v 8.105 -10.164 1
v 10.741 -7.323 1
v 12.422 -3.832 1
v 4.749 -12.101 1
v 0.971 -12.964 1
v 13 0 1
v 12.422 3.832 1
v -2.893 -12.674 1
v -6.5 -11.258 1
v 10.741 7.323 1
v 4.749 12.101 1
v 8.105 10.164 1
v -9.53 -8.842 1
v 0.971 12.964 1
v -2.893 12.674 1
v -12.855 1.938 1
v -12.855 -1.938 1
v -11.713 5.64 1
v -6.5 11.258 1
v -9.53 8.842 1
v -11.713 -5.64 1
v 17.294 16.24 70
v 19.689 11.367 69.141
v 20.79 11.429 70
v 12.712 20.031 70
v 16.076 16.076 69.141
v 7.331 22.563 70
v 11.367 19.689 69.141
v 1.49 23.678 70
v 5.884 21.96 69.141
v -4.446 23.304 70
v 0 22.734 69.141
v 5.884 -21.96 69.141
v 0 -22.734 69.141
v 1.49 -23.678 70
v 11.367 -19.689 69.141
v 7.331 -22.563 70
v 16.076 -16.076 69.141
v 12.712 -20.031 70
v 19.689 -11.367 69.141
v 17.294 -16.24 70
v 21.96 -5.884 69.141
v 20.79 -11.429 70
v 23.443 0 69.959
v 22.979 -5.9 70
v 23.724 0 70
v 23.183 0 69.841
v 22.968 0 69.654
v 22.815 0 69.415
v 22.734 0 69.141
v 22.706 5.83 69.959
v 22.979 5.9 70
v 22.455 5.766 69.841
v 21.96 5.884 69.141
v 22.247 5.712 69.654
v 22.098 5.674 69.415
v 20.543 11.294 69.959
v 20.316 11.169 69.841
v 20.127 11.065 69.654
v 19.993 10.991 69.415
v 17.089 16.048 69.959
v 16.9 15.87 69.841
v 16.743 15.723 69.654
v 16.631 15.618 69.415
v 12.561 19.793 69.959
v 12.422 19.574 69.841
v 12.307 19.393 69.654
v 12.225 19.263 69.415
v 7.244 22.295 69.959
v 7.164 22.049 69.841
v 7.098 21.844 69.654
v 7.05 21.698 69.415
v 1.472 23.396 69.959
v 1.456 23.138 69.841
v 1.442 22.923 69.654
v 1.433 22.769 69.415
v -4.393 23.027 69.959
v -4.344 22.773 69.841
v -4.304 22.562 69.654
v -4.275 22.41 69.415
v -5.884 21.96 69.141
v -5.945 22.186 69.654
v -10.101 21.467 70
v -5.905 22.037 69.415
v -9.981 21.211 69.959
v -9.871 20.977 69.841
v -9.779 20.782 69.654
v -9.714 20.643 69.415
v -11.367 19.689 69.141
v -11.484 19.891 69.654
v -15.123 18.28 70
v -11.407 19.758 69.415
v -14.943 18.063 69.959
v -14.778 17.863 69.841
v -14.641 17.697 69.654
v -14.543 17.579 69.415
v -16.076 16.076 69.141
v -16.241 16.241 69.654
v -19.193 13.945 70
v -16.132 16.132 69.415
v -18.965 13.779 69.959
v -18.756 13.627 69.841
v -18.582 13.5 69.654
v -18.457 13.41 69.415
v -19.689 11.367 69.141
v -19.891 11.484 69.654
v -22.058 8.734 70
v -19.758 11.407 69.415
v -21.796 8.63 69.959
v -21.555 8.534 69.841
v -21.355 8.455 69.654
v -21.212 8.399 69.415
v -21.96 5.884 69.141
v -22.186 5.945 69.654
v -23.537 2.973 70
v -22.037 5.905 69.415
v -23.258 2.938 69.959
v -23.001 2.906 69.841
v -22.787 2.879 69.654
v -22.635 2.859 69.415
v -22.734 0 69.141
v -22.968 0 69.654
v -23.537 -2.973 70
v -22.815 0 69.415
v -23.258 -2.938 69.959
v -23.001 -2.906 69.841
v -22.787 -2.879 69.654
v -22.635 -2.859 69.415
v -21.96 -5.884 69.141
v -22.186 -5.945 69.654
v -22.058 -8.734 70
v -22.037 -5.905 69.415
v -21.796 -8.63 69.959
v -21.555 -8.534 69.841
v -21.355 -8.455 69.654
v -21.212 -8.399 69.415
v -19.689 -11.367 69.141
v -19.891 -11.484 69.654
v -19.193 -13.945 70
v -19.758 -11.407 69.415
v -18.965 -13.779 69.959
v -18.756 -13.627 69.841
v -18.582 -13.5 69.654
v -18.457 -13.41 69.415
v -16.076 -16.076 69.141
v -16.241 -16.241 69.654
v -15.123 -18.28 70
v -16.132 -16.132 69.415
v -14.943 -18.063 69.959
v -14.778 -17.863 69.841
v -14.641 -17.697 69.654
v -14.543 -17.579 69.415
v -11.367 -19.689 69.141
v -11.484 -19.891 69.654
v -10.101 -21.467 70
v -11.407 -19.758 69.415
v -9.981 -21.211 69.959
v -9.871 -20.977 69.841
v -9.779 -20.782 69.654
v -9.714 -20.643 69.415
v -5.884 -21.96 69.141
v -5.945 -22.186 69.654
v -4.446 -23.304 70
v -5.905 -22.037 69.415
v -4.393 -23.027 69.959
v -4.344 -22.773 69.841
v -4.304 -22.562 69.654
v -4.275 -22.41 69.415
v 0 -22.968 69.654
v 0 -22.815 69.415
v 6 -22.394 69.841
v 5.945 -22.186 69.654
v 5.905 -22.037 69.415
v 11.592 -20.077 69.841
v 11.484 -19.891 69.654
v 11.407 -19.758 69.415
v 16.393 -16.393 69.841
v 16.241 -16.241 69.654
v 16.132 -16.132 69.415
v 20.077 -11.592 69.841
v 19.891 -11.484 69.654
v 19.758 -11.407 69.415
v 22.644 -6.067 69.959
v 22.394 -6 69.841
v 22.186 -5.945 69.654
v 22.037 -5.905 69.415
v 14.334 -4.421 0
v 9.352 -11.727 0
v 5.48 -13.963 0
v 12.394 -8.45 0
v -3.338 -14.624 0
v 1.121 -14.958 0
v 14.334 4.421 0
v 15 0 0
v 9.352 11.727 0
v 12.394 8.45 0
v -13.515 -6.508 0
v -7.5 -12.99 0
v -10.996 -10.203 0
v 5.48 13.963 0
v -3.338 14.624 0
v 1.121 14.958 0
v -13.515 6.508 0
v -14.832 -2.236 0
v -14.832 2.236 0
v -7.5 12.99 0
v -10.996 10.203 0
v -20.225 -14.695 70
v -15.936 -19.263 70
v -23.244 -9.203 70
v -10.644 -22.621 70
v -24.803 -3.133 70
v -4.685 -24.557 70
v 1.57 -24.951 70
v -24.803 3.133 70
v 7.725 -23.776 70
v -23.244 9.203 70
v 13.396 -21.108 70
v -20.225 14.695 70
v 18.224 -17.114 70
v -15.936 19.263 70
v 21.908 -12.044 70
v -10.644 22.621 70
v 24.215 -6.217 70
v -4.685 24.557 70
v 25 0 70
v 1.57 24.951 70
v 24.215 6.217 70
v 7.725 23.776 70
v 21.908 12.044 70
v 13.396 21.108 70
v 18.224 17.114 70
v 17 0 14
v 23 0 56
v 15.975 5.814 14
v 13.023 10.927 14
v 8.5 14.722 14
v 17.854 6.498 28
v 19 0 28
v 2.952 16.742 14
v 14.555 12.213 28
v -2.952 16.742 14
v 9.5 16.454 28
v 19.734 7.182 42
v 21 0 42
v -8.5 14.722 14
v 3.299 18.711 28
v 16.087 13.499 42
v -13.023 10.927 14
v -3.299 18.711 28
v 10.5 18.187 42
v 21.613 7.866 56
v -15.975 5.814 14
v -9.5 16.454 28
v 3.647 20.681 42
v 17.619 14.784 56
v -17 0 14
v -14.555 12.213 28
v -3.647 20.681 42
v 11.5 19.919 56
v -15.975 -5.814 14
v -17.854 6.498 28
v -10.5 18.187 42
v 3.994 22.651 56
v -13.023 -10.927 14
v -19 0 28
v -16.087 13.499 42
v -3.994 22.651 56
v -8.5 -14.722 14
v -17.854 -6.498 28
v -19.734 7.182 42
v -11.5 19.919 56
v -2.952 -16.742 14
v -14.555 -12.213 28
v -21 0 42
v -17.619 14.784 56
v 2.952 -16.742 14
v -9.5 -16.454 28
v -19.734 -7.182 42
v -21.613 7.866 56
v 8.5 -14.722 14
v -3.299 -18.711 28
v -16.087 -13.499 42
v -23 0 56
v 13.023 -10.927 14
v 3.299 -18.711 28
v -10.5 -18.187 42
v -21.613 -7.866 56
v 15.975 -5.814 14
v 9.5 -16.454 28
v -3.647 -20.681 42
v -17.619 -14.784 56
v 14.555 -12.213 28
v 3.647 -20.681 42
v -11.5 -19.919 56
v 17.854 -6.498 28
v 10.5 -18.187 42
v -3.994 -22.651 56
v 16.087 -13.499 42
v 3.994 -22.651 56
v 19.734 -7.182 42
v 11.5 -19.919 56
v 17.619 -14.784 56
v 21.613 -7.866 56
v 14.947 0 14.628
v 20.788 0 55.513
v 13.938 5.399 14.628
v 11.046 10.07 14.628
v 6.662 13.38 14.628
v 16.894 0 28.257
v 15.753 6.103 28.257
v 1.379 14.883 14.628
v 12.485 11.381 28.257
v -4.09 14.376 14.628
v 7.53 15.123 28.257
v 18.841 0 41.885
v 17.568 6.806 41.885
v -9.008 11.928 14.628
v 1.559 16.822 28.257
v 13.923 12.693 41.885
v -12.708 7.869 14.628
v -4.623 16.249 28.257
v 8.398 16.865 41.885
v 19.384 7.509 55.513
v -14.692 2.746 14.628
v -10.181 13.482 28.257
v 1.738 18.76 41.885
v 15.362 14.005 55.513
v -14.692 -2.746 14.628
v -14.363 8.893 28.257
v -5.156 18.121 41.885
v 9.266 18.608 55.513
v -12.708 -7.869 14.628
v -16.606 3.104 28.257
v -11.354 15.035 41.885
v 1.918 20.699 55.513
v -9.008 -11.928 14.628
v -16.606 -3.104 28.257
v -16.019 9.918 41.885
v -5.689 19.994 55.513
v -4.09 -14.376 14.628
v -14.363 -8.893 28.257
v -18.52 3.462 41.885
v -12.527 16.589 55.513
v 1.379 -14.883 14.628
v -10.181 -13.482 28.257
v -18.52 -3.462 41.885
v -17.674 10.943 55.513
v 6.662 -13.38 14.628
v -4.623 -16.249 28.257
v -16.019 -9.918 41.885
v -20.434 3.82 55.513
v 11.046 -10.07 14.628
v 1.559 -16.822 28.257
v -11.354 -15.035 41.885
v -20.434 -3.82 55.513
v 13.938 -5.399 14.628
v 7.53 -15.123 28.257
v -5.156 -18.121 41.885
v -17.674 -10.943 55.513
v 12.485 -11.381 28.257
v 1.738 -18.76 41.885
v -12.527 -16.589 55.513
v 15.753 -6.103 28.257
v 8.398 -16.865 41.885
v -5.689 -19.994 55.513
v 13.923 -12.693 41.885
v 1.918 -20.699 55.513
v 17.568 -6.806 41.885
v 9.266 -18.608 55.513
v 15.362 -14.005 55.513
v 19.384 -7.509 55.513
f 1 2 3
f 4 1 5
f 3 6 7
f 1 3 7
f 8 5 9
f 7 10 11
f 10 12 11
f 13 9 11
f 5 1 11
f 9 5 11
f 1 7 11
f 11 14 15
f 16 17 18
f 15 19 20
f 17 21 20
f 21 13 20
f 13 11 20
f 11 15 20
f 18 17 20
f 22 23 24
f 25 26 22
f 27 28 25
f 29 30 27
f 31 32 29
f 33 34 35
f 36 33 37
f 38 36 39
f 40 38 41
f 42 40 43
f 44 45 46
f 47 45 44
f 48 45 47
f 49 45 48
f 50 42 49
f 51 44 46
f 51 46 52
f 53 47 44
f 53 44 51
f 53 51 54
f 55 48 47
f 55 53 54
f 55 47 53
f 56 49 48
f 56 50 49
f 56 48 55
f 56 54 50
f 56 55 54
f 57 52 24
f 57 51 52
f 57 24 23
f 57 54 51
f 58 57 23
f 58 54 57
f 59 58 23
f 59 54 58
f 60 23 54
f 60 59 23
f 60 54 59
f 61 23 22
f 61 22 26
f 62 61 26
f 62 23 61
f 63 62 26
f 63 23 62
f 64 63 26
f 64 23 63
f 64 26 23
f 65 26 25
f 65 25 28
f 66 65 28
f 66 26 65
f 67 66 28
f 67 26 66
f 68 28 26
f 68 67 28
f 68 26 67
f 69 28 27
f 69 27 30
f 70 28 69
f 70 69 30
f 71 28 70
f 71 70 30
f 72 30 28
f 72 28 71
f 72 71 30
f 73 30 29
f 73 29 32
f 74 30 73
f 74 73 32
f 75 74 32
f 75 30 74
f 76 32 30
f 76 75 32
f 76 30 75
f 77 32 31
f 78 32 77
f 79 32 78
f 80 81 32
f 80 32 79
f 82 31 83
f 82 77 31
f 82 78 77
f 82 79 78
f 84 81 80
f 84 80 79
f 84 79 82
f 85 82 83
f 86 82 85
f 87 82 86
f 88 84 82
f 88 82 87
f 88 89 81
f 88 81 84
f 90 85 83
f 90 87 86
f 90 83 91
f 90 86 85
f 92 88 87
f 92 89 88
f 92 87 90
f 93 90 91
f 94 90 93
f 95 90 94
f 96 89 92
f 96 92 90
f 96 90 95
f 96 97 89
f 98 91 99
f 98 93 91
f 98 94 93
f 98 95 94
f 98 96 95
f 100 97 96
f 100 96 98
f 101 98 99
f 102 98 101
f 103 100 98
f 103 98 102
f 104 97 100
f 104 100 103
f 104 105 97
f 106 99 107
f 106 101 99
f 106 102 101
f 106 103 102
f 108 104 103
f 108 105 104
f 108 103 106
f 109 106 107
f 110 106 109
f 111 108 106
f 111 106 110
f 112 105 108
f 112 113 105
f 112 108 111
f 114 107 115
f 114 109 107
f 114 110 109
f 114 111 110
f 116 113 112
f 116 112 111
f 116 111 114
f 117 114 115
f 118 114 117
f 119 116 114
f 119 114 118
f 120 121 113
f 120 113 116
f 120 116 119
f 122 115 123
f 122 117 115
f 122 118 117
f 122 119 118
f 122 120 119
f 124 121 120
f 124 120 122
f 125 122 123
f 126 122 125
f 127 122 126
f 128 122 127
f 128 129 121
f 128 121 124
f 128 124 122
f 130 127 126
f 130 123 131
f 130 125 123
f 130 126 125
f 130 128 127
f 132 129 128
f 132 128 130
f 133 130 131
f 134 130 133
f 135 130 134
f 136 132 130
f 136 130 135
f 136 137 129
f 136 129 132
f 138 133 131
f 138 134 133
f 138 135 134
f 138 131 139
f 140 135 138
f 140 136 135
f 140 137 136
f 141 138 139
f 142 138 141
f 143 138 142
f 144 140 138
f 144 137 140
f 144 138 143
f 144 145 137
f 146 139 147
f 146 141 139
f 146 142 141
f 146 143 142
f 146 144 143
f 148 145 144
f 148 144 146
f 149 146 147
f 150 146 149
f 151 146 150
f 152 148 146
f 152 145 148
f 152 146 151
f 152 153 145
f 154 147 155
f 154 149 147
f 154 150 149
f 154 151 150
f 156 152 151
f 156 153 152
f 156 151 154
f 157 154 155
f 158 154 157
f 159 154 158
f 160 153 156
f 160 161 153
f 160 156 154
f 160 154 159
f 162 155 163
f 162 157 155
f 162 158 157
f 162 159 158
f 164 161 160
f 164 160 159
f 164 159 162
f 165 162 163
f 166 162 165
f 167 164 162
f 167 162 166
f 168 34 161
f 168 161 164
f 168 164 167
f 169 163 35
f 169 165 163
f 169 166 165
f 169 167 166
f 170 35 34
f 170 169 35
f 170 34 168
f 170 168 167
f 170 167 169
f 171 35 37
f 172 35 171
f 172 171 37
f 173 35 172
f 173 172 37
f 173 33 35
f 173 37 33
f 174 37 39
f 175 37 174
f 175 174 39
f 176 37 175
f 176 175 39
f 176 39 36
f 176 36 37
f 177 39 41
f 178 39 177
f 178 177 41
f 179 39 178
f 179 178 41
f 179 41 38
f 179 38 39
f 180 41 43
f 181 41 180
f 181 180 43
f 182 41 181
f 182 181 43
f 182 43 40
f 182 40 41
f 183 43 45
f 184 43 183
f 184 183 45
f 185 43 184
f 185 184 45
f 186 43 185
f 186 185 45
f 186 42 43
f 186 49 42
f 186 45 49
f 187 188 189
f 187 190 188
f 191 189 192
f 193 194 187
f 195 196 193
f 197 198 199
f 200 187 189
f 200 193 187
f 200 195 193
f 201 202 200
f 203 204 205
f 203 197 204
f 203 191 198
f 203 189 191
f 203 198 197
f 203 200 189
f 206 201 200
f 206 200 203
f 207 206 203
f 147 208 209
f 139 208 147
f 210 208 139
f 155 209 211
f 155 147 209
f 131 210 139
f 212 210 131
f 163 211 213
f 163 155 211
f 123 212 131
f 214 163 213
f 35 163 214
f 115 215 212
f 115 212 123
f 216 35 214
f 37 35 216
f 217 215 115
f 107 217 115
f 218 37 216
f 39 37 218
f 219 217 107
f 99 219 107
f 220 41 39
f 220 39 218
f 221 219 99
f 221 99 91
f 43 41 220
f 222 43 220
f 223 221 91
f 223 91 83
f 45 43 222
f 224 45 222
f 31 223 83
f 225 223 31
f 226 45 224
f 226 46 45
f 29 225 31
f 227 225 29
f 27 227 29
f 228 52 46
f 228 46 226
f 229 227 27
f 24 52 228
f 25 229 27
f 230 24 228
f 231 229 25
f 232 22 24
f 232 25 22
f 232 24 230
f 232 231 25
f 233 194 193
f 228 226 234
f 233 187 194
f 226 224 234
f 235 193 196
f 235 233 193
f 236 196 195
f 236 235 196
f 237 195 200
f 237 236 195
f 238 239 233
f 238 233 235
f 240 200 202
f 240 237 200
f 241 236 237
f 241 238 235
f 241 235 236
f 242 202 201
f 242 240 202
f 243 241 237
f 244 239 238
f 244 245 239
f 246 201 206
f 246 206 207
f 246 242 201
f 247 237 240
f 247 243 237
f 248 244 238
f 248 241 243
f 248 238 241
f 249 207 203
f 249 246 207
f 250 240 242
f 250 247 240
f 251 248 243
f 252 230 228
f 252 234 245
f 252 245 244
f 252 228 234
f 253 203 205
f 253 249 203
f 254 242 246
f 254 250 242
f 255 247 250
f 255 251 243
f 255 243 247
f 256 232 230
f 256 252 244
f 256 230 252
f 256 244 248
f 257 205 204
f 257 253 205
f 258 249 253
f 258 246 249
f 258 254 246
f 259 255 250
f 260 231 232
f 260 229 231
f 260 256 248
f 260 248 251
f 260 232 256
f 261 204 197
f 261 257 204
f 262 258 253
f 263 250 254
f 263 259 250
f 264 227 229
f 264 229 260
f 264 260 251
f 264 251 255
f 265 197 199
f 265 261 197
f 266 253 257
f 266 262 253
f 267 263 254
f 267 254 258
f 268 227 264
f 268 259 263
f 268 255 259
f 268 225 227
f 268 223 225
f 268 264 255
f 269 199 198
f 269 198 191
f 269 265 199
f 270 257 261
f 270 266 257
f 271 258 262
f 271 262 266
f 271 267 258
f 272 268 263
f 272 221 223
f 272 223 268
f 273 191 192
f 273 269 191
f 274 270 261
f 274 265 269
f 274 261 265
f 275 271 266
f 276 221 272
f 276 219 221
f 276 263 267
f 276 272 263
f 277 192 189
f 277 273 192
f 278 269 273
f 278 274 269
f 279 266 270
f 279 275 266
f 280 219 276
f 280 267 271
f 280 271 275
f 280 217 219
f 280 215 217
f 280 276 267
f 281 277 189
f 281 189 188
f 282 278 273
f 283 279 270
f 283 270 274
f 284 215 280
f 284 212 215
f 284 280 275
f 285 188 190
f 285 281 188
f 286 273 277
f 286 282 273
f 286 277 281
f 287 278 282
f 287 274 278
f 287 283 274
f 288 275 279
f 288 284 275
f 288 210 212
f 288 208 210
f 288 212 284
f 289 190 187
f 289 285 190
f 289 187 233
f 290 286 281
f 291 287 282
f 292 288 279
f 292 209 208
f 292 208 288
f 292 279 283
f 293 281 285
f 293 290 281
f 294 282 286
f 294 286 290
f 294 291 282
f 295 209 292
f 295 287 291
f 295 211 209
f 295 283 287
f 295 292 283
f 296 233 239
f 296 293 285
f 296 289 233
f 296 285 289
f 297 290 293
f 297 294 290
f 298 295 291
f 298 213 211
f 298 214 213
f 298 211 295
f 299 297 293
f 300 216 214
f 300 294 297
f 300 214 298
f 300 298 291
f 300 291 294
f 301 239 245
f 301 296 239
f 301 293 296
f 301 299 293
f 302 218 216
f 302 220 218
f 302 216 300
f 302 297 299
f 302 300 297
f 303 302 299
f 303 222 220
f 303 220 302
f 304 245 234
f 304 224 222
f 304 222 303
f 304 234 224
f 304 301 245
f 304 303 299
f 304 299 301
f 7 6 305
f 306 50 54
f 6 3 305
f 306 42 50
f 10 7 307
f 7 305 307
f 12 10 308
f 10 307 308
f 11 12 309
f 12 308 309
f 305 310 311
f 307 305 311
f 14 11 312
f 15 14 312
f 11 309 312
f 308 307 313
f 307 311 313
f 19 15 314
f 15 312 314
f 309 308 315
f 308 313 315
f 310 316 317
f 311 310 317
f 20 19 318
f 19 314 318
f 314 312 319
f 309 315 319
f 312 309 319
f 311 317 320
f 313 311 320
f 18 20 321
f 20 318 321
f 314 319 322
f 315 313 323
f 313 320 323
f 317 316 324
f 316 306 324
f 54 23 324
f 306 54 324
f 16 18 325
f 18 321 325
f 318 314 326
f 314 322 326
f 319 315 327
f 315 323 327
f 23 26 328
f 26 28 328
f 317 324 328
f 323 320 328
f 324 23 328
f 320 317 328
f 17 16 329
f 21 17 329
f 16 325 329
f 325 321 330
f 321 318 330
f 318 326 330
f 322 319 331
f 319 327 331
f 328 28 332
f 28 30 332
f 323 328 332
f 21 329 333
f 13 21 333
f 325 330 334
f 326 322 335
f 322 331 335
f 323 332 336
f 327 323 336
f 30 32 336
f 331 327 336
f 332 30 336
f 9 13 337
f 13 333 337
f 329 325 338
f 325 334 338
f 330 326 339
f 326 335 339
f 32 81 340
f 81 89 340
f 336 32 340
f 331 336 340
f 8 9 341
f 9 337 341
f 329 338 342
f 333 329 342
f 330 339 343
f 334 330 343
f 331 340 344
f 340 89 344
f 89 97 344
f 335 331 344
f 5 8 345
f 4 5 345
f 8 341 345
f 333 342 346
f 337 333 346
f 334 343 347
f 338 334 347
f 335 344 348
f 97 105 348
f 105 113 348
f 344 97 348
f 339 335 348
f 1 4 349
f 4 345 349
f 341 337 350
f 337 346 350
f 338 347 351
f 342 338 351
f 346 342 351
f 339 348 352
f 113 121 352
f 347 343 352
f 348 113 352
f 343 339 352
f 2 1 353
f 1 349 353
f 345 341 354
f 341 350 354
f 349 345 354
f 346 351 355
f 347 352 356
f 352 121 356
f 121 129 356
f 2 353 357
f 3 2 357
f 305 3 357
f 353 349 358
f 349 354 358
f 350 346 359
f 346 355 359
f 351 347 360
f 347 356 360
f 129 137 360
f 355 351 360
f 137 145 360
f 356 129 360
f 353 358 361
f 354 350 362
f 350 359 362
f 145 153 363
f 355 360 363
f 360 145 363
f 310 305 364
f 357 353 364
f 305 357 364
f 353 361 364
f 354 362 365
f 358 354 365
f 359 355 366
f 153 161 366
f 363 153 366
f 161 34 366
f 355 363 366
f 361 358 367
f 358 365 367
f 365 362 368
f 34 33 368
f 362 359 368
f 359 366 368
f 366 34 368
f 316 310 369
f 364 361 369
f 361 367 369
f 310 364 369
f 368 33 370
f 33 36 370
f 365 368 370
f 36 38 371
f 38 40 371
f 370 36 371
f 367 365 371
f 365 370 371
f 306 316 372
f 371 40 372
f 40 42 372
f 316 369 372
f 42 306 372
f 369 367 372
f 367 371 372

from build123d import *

# Parameters (mm, degrees)
FILLET_R = 1


with BuildPart() as con001:
    # Cone001 → Cone001 (revolve)
    with BuildSketch(Plane(origin=(0, 0, 1), x_dir=(1, 0, 0), z_dir=(0, -1, 0))):
        Polygon((0, 0), (13, 0), (23, 70), (0, 70), align=None)
    revolve(axis=Axis((0, 0, 1), (0, 0, 1)))


with BuildPart() as fillet_body:
    # Cone → Cone (revolve)
    with BuildSketch(Plane.XZ):
        Polygon((0, 0), (15, 0), (25, 70), (0, 70), align=None)
    revolve(axis=Axis((0, 0, 0), (0, 0, 1)))

    # Cut: cut Con001
    add(con001.part, mode=Mode.SUBTRACT)

    # Fillet
    fillet_edges = [fillet_body.edges().sort_by_distance(p)[0] for p in [
        (-22.857143, 0, 70),
    ]]
    fillet(fillet_edges, radius=FILLET_R)


solid = fillet_body.part
